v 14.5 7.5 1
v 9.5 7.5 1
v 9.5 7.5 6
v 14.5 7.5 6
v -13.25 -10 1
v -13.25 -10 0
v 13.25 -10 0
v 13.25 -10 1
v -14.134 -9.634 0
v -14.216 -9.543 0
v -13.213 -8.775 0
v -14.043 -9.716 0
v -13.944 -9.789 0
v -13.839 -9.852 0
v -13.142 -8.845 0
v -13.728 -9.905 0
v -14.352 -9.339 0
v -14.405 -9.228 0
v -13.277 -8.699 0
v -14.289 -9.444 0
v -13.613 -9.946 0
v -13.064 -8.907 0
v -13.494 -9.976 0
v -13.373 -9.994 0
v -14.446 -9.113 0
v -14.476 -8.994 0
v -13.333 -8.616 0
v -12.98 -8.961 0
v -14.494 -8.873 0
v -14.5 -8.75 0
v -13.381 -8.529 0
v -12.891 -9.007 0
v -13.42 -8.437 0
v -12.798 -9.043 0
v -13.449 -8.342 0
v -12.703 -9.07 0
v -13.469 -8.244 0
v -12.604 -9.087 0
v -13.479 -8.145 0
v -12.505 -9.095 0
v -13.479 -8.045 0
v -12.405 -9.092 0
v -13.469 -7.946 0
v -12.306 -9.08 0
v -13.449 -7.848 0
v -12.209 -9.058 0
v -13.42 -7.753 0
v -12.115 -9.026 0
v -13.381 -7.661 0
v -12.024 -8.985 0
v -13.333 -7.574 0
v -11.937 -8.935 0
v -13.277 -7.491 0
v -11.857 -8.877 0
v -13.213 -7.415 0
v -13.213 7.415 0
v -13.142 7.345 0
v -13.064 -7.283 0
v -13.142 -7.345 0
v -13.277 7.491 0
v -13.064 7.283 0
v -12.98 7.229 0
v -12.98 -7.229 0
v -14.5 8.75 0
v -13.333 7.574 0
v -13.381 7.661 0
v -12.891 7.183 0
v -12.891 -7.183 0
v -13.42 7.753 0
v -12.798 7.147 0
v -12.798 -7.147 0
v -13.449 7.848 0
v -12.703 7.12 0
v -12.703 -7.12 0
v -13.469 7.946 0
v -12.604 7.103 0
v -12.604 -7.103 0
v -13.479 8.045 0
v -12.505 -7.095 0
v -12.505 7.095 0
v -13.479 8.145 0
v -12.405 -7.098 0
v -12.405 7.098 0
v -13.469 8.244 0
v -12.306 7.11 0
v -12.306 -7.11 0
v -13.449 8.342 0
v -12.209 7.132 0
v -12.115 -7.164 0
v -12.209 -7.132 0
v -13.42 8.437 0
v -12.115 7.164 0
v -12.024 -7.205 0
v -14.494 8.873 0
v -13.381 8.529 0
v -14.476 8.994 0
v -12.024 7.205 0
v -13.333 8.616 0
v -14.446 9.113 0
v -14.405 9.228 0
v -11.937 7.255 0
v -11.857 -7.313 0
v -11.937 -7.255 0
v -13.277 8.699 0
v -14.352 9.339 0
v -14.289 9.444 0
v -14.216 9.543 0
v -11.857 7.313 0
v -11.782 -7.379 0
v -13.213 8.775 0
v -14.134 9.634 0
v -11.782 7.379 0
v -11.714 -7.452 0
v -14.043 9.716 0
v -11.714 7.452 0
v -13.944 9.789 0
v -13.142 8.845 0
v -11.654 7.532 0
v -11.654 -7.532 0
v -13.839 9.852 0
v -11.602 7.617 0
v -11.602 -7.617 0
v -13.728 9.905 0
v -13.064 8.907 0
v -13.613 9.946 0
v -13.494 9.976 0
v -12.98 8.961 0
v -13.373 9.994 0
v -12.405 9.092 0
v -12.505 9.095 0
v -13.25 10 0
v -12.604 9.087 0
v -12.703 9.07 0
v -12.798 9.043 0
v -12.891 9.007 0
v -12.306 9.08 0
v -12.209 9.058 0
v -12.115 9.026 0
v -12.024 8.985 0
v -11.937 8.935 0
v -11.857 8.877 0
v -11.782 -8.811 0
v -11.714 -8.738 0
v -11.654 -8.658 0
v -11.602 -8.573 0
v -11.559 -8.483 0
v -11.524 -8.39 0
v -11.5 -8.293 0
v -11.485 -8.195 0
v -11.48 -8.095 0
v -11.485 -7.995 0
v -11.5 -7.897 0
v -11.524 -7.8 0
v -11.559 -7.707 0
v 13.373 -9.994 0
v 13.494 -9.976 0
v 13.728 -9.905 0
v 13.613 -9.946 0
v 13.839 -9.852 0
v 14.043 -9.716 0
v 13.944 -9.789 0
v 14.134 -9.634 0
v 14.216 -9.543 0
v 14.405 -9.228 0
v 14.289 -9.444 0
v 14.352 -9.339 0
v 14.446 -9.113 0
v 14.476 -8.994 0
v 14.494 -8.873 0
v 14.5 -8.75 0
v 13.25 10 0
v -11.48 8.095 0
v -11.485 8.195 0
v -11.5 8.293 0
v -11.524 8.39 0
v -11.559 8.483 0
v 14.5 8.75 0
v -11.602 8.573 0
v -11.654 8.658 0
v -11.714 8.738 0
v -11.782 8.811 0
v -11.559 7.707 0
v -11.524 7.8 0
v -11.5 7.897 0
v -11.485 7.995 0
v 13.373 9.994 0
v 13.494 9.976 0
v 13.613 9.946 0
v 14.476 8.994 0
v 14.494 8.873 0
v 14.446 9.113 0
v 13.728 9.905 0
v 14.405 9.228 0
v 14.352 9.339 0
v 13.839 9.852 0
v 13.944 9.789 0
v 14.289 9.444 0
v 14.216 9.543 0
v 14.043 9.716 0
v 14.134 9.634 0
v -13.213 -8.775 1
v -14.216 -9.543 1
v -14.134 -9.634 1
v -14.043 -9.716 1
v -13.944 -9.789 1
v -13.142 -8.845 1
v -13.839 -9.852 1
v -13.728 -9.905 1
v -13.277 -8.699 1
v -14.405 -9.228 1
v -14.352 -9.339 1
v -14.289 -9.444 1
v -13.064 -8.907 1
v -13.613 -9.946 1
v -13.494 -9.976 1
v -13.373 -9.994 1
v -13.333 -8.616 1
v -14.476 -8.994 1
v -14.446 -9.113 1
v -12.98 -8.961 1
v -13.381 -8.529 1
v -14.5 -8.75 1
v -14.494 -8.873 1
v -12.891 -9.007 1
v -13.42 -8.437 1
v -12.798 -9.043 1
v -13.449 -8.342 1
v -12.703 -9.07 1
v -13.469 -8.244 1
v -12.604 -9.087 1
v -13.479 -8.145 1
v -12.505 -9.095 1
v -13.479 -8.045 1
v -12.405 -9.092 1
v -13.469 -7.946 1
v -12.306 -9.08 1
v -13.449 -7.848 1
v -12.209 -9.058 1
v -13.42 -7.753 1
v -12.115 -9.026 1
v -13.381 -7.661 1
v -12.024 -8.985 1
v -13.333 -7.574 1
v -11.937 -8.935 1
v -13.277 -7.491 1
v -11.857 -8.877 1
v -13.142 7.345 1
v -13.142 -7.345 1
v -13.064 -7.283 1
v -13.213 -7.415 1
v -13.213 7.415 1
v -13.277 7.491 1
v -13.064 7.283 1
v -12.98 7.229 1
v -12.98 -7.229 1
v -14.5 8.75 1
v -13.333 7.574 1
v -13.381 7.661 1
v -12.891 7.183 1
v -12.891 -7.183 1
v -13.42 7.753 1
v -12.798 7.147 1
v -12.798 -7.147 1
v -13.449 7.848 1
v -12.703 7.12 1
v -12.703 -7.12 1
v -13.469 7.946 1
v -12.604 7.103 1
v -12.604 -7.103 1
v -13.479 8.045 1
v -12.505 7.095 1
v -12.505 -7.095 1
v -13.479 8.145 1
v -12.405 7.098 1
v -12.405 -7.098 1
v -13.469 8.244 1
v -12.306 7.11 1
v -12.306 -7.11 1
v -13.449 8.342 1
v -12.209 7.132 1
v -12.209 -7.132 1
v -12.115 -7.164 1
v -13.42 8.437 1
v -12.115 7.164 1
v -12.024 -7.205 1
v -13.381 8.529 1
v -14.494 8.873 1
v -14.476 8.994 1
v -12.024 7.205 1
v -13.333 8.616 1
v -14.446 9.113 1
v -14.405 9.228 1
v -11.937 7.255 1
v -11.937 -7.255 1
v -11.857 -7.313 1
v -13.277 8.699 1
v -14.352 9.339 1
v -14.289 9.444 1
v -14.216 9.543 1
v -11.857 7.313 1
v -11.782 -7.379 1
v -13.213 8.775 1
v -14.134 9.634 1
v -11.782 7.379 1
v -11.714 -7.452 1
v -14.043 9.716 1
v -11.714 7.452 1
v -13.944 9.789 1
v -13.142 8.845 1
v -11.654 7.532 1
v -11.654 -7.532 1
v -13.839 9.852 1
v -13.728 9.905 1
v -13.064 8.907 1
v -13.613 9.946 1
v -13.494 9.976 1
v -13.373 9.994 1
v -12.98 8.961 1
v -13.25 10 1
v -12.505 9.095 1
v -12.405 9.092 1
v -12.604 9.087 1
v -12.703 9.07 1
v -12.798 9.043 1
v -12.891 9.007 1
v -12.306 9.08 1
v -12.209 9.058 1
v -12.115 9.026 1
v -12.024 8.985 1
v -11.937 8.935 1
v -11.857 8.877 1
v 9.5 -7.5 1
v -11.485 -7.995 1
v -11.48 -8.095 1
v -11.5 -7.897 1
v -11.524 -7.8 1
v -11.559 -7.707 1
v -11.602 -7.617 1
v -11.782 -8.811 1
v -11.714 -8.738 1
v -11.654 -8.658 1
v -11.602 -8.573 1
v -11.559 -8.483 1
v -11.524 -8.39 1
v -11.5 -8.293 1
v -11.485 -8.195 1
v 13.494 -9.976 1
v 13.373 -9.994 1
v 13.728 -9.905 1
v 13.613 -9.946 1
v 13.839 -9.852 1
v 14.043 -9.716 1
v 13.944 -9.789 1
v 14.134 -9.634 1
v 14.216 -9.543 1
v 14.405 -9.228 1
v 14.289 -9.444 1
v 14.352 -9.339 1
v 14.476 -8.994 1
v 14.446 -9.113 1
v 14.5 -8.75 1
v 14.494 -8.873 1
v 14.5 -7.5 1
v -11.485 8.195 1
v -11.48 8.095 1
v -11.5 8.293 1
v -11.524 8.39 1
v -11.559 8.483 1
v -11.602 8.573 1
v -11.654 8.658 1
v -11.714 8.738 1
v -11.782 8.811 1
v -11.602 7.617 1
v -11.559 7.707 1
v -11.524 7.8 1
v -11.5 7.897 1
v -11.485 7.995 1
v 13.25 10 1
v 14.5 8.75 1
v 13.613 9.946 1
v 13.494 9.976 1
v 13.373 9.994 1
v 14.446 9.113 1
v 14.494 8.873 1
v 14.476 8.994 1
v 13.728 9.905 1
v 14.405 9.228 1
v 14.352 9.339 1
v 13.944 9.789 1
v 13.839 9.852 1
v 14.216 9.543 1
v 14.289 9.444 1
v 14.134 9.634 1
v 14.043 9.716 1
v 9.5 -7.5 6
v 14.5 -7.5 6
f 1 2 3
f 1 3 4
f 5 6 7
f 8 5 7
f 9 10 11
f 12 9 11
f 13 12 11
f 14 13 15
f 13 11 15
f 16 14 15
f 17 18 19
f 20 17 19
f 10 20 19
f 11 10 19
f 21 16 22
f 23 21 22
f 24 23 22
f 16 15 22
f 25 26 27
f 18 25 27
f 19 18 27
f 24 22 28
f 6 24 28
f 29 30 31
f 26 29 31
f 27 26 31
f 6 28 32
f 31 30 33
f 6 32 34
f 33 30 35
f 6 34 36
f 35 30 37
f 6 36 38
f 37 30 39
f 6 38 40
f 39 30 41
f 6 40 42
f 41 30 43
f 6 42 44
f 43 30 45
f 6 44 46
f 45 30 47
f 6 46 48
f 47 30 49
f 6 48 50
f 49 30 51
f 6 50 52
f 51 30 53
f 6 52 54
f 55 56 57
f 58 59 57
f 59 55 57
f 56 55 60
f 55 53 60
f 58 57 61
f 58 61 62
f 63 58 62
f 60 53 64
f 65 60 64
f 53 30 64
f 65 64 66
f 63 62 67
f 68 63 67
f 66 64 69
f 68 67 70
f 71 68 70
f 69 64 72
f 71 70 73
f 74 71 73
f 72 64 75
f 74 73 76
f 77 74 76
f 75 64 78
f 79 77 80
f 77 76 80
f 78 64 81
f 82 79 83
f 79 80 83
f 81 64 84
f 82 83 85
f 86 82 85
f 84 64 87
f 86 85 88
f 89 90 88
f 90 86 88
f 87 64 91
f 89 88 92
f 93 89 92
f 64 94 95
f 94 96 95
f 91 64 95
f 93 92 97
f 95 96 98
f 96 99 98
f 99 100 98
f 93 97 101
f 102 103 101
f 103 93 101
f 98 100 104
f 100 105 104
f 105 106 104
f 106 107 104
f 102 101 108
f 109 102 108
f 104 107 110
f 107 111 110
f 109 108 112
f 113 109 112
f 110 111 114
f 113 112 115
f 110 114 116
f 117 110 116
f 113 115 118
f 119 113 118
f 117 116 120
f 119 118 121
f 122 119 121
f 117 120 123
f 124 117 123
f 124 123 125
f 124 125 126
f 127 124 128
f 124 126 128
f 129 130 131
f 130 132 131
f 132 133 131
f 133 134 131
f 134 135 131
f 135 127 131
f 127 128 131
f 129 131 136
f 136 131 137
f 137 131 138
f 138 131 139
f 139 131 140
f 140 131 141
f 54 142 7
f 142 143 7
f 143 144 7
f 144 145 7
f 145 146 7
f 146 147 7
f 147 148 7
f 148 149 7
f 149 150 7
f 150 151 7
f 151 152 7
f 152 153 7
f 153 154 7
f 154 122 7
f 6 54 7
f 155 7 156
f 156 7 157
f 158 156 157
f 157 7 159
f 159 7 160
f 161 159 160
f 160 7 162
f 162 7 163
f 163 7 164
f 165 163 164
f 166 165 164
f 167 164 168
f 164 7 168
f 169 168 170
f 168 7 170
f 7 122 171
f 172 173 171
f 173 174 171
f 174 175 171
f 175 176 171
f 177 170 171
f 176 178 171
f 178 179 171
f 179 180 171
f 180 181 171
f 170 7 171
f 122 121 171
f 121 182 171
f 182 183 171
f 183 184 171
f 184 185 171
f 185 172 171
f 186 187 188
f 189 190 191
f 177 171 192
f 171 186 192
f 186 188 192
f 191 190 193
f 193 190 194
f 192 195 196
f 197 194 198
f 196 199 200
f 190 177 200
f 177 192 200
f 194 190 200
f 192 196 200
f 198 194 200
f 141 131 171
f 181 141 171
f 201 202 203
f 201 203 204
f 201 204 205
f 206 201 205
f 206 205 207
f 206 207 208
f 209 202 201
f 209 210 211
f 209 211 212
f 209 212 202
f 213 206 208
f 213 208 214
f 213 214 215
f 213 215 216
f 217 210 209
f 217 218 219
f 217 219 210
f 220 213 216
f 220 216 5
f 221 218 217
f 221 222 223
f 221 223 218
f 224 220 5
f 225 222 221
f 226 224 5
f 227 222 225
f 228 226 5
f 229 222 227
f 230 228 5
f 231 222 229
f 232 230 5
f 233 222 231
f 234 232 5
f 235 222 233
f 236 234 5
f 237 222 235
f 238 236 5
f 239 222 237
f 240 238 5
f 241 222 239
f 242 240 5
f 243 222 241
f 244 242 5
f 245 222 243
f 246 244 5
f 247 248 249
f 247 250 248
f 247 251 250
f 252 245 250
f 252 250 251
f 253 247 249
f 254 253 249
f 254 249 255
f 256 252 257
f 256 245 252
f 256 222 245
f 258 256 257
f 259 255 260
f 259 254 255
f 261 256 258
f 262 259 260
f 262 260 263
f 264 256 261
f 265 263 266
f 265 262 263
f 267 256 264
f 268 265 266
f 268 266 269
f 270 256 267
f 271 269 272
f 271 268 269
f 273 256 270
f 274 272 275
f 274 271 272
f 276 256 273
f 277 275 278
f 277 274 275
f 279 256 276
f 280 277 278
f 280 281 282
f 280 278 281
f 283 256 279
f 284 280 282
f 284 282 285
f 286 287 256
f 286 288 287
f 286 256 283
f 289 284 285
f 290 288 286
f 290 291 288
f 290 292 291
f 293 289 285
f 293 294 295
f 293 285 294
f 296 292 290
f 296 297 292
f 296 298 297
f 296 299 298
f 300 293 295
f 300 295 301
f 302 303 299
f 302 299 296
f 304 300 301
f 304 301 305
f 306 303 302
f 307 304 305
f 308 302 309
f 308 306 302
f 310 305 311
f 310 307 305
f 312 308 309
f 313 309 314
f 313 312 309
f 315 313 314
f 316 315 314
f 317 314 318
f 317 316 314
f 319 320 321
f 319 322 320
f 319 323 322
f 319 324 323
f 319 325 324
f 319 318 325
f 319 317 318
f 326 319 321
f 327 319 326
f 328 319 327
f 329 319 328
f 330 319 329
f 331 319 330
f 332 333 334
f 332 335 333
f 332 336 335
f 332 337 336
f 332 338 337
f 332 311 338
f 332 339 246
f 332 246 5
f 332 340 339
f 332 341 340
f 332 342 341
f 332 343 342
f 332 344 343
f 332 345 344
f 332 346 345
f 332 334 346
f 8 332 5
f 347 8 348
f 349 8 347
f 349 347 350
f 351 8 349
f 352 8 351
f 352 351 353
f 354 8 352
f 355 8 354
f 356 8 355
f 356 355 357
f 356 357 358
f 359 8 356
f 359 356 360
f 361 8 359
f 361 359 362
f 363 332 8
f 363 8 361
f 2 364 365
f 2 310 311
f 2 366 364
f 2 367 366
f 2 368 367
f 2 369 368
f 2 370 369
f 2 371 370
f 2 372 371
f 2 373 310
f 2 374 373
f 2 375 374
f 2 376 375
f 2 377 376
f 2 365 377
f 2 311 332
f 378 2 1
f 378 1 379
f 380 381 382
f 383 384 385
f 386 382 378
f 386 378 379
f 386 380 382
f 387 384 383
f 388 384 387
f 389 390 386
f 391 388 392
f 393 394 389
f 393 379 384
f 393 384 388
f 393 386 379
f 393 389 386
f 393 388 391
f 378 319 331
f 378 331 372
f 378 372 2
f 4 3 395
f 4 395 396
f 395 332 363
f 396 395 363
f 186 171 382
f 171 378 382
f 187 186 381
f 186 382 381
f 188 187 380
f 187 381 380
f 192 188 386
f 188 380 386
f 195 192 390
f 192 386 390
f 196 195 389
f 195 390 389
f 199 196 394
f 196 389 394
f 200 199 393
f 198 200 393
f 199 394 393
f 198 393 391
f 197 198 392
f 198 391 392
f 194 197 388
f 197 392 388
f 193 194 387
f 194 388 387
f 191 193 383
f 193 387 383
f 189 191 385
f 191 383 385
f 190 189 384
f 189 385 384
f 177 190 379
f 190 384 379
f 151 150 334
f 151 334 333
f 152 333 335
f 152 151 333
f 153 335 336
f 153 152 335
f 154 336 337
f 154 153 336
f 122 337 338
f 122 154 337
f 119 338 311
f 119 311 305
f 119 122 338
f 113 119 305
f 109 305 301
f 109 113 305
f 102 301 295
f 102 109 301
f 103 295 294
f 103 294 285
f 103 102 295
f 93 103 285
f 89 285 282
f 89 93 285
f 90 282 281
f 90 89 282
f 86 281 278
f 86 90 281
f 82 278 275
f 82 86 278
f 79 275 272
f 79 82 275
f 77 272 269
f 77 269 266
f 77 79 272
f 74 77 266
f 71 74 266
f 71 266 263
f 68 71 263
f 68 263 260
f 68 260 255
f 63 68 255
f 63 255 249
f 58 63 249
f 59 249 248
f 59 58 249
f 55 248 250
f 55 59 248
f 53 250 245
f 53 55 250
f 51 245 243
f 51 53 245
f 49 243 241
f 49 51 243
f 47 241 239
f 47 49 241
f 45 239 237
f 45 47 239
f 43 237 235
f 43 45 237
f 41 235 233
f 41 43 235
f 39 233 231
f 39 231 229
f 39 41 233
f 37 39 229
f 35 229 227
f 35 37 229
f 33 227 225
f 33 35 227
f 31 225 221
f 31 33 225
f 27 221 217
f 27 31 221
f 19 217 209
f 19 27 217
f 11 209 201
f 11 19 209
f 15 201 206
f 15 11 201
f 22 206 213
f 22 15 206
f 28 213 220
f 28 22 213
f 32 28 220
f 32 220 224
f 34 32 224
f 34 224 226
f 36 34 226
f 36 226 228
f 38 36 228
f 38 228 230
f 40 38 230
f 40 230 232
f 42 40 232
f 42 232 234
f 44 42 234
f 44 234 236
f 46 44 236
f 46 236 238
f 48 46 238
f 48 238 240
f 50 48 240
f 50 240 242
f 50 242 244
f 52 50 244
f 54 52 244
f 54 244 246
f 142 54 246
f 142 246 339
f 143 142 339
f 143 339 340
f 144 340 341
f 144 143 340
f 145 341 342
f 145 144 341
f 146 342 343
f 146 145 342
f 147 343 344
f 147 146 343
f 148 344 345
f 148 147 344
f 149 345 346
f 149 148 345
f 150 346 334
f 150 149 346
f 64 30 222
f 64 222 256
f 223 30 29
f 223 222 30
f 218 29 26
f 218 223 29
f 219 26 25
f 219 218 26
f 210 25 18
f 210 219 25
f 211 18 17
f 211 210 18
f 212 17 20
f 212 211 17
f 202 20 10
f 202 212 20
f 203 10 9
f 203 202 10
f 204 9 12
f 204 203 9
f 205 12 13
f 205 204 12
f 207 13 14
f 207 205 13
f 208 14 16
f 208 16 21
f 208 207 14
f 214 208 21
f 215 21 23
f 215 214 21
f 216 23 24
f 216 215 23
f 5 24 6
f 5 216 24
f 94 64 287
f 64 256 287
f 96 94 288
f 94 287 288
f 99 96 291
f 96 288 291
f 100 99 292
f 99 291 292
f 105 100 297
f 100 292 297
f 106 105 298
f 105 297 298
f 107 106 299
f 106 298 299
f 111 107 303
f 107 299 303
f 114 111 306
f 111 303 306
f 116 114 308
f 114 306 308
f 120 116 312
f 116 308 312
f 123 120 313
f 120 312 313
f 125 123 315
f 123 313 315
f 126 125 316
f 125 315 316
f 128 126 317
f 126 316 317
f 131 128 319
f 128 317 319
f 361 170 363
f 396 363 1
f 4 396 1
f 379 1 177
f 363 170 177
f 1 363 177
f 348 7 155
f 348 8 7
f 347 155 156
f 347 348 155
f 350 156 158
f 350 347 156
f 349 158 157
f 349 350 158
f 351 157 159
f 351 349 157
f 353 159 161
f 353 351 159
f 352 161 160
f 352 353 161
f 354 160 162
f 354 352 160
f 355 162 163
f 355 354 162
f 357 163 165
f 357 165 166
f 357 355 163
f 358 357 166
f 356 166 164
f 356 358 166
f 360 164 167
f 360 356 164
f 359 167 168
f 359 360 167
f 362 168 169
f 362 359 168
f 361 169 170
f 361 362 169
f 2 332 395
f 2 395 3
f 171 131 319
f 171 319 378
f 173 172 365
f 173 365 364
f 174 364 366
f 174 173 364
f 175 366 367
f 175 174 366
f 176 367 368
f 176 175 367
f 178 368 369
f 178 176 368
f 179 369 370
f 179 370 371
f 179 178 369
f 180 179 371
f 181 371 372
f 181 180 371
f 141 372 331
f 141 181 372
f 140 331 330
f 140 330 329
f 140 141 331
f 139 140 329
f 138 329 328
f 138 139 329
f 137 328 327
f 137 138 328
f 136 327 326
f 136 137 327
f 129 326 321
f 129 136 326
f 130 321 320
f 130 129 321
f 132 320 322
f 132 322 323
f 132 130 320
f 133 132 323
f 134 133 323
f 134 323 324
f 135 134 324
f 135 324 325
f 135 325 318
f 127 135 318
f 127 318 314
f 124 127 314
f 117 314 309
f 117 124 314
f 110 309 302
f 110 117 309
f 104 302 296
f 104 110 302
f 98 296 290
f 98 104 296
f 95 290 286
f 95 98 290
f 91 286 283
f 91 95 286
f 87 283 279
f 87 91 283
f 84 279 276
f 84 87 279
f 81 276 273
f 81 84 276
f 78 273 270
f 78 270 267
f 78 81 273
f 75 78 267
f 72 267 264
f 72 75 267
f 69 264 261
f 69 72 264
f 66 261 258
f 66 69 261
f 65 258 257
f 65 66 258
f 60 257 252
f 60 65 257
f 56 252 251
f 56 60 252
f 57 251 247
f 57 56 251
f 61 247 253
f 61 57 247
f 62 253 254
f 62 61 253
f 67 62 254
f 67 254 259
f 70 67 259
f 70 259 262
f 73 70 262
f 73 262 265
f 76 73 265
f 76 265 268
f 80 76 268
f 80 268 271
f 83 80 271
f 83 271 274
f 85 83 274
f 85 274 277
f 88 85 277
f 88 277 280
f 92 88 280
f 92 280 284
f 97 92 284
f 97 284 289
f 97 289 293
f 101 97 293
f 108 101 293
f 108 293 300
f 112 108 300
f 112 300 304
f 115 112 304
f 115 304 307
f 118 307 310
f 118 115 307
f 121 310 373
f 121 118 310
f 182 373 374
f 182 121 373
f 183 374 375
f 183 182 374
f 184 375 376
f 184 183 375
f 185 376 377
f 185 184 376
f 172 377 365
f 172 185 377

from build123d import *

# Parameters (mm, degrees)
SKETCH_W     = 29
SKETCH_H     = 20
SKETCH_R     = 1
PAD_DEPTH    = 1
FILLET_R     = 1.25
SKETCH001_W  = 5
SKETCH001_H  = 15
PAD001_DEPTH = 5


with BuildPart() as part:
    # Sketch → Pad (new body)
    with BuildSketch(Plane.XY):
        Rectangle(SKETCH_W, SKETCH_H)
        with Locations((-12.48, -8.095)):
            Circle(SKETCH_R, mode=Mode.SUBTRACT)
        with Locations((-12.48, 8.095)):
            Circle(SKETCH_R, mode=Mode.SUBTRACT)
    extrude(amount=PAD_DEPTH)

    # Fillet
    fillet_edges = [part.edges().sort_by_distance(p)[0] for p in [
        (14.5, -10, 0.5),
        (14.5, 10, 0.5),
        (-14.5, -10, 0.5),
        (-14.5, 10, 0.5),
    ]]
    fillet(fillet_edges, radius=FILLET_R)

    # Sketch001 (on Face5 of Fillet) → Pad001 (join)
    with BuildSketch(Plane.XY.offset(1)):
        with Locations((12, 0)):
            Rectangle(SKETCH001_W, SKETCH001_H)
    extrude(amount=PAD001_DEPTH)


solid = part.part
